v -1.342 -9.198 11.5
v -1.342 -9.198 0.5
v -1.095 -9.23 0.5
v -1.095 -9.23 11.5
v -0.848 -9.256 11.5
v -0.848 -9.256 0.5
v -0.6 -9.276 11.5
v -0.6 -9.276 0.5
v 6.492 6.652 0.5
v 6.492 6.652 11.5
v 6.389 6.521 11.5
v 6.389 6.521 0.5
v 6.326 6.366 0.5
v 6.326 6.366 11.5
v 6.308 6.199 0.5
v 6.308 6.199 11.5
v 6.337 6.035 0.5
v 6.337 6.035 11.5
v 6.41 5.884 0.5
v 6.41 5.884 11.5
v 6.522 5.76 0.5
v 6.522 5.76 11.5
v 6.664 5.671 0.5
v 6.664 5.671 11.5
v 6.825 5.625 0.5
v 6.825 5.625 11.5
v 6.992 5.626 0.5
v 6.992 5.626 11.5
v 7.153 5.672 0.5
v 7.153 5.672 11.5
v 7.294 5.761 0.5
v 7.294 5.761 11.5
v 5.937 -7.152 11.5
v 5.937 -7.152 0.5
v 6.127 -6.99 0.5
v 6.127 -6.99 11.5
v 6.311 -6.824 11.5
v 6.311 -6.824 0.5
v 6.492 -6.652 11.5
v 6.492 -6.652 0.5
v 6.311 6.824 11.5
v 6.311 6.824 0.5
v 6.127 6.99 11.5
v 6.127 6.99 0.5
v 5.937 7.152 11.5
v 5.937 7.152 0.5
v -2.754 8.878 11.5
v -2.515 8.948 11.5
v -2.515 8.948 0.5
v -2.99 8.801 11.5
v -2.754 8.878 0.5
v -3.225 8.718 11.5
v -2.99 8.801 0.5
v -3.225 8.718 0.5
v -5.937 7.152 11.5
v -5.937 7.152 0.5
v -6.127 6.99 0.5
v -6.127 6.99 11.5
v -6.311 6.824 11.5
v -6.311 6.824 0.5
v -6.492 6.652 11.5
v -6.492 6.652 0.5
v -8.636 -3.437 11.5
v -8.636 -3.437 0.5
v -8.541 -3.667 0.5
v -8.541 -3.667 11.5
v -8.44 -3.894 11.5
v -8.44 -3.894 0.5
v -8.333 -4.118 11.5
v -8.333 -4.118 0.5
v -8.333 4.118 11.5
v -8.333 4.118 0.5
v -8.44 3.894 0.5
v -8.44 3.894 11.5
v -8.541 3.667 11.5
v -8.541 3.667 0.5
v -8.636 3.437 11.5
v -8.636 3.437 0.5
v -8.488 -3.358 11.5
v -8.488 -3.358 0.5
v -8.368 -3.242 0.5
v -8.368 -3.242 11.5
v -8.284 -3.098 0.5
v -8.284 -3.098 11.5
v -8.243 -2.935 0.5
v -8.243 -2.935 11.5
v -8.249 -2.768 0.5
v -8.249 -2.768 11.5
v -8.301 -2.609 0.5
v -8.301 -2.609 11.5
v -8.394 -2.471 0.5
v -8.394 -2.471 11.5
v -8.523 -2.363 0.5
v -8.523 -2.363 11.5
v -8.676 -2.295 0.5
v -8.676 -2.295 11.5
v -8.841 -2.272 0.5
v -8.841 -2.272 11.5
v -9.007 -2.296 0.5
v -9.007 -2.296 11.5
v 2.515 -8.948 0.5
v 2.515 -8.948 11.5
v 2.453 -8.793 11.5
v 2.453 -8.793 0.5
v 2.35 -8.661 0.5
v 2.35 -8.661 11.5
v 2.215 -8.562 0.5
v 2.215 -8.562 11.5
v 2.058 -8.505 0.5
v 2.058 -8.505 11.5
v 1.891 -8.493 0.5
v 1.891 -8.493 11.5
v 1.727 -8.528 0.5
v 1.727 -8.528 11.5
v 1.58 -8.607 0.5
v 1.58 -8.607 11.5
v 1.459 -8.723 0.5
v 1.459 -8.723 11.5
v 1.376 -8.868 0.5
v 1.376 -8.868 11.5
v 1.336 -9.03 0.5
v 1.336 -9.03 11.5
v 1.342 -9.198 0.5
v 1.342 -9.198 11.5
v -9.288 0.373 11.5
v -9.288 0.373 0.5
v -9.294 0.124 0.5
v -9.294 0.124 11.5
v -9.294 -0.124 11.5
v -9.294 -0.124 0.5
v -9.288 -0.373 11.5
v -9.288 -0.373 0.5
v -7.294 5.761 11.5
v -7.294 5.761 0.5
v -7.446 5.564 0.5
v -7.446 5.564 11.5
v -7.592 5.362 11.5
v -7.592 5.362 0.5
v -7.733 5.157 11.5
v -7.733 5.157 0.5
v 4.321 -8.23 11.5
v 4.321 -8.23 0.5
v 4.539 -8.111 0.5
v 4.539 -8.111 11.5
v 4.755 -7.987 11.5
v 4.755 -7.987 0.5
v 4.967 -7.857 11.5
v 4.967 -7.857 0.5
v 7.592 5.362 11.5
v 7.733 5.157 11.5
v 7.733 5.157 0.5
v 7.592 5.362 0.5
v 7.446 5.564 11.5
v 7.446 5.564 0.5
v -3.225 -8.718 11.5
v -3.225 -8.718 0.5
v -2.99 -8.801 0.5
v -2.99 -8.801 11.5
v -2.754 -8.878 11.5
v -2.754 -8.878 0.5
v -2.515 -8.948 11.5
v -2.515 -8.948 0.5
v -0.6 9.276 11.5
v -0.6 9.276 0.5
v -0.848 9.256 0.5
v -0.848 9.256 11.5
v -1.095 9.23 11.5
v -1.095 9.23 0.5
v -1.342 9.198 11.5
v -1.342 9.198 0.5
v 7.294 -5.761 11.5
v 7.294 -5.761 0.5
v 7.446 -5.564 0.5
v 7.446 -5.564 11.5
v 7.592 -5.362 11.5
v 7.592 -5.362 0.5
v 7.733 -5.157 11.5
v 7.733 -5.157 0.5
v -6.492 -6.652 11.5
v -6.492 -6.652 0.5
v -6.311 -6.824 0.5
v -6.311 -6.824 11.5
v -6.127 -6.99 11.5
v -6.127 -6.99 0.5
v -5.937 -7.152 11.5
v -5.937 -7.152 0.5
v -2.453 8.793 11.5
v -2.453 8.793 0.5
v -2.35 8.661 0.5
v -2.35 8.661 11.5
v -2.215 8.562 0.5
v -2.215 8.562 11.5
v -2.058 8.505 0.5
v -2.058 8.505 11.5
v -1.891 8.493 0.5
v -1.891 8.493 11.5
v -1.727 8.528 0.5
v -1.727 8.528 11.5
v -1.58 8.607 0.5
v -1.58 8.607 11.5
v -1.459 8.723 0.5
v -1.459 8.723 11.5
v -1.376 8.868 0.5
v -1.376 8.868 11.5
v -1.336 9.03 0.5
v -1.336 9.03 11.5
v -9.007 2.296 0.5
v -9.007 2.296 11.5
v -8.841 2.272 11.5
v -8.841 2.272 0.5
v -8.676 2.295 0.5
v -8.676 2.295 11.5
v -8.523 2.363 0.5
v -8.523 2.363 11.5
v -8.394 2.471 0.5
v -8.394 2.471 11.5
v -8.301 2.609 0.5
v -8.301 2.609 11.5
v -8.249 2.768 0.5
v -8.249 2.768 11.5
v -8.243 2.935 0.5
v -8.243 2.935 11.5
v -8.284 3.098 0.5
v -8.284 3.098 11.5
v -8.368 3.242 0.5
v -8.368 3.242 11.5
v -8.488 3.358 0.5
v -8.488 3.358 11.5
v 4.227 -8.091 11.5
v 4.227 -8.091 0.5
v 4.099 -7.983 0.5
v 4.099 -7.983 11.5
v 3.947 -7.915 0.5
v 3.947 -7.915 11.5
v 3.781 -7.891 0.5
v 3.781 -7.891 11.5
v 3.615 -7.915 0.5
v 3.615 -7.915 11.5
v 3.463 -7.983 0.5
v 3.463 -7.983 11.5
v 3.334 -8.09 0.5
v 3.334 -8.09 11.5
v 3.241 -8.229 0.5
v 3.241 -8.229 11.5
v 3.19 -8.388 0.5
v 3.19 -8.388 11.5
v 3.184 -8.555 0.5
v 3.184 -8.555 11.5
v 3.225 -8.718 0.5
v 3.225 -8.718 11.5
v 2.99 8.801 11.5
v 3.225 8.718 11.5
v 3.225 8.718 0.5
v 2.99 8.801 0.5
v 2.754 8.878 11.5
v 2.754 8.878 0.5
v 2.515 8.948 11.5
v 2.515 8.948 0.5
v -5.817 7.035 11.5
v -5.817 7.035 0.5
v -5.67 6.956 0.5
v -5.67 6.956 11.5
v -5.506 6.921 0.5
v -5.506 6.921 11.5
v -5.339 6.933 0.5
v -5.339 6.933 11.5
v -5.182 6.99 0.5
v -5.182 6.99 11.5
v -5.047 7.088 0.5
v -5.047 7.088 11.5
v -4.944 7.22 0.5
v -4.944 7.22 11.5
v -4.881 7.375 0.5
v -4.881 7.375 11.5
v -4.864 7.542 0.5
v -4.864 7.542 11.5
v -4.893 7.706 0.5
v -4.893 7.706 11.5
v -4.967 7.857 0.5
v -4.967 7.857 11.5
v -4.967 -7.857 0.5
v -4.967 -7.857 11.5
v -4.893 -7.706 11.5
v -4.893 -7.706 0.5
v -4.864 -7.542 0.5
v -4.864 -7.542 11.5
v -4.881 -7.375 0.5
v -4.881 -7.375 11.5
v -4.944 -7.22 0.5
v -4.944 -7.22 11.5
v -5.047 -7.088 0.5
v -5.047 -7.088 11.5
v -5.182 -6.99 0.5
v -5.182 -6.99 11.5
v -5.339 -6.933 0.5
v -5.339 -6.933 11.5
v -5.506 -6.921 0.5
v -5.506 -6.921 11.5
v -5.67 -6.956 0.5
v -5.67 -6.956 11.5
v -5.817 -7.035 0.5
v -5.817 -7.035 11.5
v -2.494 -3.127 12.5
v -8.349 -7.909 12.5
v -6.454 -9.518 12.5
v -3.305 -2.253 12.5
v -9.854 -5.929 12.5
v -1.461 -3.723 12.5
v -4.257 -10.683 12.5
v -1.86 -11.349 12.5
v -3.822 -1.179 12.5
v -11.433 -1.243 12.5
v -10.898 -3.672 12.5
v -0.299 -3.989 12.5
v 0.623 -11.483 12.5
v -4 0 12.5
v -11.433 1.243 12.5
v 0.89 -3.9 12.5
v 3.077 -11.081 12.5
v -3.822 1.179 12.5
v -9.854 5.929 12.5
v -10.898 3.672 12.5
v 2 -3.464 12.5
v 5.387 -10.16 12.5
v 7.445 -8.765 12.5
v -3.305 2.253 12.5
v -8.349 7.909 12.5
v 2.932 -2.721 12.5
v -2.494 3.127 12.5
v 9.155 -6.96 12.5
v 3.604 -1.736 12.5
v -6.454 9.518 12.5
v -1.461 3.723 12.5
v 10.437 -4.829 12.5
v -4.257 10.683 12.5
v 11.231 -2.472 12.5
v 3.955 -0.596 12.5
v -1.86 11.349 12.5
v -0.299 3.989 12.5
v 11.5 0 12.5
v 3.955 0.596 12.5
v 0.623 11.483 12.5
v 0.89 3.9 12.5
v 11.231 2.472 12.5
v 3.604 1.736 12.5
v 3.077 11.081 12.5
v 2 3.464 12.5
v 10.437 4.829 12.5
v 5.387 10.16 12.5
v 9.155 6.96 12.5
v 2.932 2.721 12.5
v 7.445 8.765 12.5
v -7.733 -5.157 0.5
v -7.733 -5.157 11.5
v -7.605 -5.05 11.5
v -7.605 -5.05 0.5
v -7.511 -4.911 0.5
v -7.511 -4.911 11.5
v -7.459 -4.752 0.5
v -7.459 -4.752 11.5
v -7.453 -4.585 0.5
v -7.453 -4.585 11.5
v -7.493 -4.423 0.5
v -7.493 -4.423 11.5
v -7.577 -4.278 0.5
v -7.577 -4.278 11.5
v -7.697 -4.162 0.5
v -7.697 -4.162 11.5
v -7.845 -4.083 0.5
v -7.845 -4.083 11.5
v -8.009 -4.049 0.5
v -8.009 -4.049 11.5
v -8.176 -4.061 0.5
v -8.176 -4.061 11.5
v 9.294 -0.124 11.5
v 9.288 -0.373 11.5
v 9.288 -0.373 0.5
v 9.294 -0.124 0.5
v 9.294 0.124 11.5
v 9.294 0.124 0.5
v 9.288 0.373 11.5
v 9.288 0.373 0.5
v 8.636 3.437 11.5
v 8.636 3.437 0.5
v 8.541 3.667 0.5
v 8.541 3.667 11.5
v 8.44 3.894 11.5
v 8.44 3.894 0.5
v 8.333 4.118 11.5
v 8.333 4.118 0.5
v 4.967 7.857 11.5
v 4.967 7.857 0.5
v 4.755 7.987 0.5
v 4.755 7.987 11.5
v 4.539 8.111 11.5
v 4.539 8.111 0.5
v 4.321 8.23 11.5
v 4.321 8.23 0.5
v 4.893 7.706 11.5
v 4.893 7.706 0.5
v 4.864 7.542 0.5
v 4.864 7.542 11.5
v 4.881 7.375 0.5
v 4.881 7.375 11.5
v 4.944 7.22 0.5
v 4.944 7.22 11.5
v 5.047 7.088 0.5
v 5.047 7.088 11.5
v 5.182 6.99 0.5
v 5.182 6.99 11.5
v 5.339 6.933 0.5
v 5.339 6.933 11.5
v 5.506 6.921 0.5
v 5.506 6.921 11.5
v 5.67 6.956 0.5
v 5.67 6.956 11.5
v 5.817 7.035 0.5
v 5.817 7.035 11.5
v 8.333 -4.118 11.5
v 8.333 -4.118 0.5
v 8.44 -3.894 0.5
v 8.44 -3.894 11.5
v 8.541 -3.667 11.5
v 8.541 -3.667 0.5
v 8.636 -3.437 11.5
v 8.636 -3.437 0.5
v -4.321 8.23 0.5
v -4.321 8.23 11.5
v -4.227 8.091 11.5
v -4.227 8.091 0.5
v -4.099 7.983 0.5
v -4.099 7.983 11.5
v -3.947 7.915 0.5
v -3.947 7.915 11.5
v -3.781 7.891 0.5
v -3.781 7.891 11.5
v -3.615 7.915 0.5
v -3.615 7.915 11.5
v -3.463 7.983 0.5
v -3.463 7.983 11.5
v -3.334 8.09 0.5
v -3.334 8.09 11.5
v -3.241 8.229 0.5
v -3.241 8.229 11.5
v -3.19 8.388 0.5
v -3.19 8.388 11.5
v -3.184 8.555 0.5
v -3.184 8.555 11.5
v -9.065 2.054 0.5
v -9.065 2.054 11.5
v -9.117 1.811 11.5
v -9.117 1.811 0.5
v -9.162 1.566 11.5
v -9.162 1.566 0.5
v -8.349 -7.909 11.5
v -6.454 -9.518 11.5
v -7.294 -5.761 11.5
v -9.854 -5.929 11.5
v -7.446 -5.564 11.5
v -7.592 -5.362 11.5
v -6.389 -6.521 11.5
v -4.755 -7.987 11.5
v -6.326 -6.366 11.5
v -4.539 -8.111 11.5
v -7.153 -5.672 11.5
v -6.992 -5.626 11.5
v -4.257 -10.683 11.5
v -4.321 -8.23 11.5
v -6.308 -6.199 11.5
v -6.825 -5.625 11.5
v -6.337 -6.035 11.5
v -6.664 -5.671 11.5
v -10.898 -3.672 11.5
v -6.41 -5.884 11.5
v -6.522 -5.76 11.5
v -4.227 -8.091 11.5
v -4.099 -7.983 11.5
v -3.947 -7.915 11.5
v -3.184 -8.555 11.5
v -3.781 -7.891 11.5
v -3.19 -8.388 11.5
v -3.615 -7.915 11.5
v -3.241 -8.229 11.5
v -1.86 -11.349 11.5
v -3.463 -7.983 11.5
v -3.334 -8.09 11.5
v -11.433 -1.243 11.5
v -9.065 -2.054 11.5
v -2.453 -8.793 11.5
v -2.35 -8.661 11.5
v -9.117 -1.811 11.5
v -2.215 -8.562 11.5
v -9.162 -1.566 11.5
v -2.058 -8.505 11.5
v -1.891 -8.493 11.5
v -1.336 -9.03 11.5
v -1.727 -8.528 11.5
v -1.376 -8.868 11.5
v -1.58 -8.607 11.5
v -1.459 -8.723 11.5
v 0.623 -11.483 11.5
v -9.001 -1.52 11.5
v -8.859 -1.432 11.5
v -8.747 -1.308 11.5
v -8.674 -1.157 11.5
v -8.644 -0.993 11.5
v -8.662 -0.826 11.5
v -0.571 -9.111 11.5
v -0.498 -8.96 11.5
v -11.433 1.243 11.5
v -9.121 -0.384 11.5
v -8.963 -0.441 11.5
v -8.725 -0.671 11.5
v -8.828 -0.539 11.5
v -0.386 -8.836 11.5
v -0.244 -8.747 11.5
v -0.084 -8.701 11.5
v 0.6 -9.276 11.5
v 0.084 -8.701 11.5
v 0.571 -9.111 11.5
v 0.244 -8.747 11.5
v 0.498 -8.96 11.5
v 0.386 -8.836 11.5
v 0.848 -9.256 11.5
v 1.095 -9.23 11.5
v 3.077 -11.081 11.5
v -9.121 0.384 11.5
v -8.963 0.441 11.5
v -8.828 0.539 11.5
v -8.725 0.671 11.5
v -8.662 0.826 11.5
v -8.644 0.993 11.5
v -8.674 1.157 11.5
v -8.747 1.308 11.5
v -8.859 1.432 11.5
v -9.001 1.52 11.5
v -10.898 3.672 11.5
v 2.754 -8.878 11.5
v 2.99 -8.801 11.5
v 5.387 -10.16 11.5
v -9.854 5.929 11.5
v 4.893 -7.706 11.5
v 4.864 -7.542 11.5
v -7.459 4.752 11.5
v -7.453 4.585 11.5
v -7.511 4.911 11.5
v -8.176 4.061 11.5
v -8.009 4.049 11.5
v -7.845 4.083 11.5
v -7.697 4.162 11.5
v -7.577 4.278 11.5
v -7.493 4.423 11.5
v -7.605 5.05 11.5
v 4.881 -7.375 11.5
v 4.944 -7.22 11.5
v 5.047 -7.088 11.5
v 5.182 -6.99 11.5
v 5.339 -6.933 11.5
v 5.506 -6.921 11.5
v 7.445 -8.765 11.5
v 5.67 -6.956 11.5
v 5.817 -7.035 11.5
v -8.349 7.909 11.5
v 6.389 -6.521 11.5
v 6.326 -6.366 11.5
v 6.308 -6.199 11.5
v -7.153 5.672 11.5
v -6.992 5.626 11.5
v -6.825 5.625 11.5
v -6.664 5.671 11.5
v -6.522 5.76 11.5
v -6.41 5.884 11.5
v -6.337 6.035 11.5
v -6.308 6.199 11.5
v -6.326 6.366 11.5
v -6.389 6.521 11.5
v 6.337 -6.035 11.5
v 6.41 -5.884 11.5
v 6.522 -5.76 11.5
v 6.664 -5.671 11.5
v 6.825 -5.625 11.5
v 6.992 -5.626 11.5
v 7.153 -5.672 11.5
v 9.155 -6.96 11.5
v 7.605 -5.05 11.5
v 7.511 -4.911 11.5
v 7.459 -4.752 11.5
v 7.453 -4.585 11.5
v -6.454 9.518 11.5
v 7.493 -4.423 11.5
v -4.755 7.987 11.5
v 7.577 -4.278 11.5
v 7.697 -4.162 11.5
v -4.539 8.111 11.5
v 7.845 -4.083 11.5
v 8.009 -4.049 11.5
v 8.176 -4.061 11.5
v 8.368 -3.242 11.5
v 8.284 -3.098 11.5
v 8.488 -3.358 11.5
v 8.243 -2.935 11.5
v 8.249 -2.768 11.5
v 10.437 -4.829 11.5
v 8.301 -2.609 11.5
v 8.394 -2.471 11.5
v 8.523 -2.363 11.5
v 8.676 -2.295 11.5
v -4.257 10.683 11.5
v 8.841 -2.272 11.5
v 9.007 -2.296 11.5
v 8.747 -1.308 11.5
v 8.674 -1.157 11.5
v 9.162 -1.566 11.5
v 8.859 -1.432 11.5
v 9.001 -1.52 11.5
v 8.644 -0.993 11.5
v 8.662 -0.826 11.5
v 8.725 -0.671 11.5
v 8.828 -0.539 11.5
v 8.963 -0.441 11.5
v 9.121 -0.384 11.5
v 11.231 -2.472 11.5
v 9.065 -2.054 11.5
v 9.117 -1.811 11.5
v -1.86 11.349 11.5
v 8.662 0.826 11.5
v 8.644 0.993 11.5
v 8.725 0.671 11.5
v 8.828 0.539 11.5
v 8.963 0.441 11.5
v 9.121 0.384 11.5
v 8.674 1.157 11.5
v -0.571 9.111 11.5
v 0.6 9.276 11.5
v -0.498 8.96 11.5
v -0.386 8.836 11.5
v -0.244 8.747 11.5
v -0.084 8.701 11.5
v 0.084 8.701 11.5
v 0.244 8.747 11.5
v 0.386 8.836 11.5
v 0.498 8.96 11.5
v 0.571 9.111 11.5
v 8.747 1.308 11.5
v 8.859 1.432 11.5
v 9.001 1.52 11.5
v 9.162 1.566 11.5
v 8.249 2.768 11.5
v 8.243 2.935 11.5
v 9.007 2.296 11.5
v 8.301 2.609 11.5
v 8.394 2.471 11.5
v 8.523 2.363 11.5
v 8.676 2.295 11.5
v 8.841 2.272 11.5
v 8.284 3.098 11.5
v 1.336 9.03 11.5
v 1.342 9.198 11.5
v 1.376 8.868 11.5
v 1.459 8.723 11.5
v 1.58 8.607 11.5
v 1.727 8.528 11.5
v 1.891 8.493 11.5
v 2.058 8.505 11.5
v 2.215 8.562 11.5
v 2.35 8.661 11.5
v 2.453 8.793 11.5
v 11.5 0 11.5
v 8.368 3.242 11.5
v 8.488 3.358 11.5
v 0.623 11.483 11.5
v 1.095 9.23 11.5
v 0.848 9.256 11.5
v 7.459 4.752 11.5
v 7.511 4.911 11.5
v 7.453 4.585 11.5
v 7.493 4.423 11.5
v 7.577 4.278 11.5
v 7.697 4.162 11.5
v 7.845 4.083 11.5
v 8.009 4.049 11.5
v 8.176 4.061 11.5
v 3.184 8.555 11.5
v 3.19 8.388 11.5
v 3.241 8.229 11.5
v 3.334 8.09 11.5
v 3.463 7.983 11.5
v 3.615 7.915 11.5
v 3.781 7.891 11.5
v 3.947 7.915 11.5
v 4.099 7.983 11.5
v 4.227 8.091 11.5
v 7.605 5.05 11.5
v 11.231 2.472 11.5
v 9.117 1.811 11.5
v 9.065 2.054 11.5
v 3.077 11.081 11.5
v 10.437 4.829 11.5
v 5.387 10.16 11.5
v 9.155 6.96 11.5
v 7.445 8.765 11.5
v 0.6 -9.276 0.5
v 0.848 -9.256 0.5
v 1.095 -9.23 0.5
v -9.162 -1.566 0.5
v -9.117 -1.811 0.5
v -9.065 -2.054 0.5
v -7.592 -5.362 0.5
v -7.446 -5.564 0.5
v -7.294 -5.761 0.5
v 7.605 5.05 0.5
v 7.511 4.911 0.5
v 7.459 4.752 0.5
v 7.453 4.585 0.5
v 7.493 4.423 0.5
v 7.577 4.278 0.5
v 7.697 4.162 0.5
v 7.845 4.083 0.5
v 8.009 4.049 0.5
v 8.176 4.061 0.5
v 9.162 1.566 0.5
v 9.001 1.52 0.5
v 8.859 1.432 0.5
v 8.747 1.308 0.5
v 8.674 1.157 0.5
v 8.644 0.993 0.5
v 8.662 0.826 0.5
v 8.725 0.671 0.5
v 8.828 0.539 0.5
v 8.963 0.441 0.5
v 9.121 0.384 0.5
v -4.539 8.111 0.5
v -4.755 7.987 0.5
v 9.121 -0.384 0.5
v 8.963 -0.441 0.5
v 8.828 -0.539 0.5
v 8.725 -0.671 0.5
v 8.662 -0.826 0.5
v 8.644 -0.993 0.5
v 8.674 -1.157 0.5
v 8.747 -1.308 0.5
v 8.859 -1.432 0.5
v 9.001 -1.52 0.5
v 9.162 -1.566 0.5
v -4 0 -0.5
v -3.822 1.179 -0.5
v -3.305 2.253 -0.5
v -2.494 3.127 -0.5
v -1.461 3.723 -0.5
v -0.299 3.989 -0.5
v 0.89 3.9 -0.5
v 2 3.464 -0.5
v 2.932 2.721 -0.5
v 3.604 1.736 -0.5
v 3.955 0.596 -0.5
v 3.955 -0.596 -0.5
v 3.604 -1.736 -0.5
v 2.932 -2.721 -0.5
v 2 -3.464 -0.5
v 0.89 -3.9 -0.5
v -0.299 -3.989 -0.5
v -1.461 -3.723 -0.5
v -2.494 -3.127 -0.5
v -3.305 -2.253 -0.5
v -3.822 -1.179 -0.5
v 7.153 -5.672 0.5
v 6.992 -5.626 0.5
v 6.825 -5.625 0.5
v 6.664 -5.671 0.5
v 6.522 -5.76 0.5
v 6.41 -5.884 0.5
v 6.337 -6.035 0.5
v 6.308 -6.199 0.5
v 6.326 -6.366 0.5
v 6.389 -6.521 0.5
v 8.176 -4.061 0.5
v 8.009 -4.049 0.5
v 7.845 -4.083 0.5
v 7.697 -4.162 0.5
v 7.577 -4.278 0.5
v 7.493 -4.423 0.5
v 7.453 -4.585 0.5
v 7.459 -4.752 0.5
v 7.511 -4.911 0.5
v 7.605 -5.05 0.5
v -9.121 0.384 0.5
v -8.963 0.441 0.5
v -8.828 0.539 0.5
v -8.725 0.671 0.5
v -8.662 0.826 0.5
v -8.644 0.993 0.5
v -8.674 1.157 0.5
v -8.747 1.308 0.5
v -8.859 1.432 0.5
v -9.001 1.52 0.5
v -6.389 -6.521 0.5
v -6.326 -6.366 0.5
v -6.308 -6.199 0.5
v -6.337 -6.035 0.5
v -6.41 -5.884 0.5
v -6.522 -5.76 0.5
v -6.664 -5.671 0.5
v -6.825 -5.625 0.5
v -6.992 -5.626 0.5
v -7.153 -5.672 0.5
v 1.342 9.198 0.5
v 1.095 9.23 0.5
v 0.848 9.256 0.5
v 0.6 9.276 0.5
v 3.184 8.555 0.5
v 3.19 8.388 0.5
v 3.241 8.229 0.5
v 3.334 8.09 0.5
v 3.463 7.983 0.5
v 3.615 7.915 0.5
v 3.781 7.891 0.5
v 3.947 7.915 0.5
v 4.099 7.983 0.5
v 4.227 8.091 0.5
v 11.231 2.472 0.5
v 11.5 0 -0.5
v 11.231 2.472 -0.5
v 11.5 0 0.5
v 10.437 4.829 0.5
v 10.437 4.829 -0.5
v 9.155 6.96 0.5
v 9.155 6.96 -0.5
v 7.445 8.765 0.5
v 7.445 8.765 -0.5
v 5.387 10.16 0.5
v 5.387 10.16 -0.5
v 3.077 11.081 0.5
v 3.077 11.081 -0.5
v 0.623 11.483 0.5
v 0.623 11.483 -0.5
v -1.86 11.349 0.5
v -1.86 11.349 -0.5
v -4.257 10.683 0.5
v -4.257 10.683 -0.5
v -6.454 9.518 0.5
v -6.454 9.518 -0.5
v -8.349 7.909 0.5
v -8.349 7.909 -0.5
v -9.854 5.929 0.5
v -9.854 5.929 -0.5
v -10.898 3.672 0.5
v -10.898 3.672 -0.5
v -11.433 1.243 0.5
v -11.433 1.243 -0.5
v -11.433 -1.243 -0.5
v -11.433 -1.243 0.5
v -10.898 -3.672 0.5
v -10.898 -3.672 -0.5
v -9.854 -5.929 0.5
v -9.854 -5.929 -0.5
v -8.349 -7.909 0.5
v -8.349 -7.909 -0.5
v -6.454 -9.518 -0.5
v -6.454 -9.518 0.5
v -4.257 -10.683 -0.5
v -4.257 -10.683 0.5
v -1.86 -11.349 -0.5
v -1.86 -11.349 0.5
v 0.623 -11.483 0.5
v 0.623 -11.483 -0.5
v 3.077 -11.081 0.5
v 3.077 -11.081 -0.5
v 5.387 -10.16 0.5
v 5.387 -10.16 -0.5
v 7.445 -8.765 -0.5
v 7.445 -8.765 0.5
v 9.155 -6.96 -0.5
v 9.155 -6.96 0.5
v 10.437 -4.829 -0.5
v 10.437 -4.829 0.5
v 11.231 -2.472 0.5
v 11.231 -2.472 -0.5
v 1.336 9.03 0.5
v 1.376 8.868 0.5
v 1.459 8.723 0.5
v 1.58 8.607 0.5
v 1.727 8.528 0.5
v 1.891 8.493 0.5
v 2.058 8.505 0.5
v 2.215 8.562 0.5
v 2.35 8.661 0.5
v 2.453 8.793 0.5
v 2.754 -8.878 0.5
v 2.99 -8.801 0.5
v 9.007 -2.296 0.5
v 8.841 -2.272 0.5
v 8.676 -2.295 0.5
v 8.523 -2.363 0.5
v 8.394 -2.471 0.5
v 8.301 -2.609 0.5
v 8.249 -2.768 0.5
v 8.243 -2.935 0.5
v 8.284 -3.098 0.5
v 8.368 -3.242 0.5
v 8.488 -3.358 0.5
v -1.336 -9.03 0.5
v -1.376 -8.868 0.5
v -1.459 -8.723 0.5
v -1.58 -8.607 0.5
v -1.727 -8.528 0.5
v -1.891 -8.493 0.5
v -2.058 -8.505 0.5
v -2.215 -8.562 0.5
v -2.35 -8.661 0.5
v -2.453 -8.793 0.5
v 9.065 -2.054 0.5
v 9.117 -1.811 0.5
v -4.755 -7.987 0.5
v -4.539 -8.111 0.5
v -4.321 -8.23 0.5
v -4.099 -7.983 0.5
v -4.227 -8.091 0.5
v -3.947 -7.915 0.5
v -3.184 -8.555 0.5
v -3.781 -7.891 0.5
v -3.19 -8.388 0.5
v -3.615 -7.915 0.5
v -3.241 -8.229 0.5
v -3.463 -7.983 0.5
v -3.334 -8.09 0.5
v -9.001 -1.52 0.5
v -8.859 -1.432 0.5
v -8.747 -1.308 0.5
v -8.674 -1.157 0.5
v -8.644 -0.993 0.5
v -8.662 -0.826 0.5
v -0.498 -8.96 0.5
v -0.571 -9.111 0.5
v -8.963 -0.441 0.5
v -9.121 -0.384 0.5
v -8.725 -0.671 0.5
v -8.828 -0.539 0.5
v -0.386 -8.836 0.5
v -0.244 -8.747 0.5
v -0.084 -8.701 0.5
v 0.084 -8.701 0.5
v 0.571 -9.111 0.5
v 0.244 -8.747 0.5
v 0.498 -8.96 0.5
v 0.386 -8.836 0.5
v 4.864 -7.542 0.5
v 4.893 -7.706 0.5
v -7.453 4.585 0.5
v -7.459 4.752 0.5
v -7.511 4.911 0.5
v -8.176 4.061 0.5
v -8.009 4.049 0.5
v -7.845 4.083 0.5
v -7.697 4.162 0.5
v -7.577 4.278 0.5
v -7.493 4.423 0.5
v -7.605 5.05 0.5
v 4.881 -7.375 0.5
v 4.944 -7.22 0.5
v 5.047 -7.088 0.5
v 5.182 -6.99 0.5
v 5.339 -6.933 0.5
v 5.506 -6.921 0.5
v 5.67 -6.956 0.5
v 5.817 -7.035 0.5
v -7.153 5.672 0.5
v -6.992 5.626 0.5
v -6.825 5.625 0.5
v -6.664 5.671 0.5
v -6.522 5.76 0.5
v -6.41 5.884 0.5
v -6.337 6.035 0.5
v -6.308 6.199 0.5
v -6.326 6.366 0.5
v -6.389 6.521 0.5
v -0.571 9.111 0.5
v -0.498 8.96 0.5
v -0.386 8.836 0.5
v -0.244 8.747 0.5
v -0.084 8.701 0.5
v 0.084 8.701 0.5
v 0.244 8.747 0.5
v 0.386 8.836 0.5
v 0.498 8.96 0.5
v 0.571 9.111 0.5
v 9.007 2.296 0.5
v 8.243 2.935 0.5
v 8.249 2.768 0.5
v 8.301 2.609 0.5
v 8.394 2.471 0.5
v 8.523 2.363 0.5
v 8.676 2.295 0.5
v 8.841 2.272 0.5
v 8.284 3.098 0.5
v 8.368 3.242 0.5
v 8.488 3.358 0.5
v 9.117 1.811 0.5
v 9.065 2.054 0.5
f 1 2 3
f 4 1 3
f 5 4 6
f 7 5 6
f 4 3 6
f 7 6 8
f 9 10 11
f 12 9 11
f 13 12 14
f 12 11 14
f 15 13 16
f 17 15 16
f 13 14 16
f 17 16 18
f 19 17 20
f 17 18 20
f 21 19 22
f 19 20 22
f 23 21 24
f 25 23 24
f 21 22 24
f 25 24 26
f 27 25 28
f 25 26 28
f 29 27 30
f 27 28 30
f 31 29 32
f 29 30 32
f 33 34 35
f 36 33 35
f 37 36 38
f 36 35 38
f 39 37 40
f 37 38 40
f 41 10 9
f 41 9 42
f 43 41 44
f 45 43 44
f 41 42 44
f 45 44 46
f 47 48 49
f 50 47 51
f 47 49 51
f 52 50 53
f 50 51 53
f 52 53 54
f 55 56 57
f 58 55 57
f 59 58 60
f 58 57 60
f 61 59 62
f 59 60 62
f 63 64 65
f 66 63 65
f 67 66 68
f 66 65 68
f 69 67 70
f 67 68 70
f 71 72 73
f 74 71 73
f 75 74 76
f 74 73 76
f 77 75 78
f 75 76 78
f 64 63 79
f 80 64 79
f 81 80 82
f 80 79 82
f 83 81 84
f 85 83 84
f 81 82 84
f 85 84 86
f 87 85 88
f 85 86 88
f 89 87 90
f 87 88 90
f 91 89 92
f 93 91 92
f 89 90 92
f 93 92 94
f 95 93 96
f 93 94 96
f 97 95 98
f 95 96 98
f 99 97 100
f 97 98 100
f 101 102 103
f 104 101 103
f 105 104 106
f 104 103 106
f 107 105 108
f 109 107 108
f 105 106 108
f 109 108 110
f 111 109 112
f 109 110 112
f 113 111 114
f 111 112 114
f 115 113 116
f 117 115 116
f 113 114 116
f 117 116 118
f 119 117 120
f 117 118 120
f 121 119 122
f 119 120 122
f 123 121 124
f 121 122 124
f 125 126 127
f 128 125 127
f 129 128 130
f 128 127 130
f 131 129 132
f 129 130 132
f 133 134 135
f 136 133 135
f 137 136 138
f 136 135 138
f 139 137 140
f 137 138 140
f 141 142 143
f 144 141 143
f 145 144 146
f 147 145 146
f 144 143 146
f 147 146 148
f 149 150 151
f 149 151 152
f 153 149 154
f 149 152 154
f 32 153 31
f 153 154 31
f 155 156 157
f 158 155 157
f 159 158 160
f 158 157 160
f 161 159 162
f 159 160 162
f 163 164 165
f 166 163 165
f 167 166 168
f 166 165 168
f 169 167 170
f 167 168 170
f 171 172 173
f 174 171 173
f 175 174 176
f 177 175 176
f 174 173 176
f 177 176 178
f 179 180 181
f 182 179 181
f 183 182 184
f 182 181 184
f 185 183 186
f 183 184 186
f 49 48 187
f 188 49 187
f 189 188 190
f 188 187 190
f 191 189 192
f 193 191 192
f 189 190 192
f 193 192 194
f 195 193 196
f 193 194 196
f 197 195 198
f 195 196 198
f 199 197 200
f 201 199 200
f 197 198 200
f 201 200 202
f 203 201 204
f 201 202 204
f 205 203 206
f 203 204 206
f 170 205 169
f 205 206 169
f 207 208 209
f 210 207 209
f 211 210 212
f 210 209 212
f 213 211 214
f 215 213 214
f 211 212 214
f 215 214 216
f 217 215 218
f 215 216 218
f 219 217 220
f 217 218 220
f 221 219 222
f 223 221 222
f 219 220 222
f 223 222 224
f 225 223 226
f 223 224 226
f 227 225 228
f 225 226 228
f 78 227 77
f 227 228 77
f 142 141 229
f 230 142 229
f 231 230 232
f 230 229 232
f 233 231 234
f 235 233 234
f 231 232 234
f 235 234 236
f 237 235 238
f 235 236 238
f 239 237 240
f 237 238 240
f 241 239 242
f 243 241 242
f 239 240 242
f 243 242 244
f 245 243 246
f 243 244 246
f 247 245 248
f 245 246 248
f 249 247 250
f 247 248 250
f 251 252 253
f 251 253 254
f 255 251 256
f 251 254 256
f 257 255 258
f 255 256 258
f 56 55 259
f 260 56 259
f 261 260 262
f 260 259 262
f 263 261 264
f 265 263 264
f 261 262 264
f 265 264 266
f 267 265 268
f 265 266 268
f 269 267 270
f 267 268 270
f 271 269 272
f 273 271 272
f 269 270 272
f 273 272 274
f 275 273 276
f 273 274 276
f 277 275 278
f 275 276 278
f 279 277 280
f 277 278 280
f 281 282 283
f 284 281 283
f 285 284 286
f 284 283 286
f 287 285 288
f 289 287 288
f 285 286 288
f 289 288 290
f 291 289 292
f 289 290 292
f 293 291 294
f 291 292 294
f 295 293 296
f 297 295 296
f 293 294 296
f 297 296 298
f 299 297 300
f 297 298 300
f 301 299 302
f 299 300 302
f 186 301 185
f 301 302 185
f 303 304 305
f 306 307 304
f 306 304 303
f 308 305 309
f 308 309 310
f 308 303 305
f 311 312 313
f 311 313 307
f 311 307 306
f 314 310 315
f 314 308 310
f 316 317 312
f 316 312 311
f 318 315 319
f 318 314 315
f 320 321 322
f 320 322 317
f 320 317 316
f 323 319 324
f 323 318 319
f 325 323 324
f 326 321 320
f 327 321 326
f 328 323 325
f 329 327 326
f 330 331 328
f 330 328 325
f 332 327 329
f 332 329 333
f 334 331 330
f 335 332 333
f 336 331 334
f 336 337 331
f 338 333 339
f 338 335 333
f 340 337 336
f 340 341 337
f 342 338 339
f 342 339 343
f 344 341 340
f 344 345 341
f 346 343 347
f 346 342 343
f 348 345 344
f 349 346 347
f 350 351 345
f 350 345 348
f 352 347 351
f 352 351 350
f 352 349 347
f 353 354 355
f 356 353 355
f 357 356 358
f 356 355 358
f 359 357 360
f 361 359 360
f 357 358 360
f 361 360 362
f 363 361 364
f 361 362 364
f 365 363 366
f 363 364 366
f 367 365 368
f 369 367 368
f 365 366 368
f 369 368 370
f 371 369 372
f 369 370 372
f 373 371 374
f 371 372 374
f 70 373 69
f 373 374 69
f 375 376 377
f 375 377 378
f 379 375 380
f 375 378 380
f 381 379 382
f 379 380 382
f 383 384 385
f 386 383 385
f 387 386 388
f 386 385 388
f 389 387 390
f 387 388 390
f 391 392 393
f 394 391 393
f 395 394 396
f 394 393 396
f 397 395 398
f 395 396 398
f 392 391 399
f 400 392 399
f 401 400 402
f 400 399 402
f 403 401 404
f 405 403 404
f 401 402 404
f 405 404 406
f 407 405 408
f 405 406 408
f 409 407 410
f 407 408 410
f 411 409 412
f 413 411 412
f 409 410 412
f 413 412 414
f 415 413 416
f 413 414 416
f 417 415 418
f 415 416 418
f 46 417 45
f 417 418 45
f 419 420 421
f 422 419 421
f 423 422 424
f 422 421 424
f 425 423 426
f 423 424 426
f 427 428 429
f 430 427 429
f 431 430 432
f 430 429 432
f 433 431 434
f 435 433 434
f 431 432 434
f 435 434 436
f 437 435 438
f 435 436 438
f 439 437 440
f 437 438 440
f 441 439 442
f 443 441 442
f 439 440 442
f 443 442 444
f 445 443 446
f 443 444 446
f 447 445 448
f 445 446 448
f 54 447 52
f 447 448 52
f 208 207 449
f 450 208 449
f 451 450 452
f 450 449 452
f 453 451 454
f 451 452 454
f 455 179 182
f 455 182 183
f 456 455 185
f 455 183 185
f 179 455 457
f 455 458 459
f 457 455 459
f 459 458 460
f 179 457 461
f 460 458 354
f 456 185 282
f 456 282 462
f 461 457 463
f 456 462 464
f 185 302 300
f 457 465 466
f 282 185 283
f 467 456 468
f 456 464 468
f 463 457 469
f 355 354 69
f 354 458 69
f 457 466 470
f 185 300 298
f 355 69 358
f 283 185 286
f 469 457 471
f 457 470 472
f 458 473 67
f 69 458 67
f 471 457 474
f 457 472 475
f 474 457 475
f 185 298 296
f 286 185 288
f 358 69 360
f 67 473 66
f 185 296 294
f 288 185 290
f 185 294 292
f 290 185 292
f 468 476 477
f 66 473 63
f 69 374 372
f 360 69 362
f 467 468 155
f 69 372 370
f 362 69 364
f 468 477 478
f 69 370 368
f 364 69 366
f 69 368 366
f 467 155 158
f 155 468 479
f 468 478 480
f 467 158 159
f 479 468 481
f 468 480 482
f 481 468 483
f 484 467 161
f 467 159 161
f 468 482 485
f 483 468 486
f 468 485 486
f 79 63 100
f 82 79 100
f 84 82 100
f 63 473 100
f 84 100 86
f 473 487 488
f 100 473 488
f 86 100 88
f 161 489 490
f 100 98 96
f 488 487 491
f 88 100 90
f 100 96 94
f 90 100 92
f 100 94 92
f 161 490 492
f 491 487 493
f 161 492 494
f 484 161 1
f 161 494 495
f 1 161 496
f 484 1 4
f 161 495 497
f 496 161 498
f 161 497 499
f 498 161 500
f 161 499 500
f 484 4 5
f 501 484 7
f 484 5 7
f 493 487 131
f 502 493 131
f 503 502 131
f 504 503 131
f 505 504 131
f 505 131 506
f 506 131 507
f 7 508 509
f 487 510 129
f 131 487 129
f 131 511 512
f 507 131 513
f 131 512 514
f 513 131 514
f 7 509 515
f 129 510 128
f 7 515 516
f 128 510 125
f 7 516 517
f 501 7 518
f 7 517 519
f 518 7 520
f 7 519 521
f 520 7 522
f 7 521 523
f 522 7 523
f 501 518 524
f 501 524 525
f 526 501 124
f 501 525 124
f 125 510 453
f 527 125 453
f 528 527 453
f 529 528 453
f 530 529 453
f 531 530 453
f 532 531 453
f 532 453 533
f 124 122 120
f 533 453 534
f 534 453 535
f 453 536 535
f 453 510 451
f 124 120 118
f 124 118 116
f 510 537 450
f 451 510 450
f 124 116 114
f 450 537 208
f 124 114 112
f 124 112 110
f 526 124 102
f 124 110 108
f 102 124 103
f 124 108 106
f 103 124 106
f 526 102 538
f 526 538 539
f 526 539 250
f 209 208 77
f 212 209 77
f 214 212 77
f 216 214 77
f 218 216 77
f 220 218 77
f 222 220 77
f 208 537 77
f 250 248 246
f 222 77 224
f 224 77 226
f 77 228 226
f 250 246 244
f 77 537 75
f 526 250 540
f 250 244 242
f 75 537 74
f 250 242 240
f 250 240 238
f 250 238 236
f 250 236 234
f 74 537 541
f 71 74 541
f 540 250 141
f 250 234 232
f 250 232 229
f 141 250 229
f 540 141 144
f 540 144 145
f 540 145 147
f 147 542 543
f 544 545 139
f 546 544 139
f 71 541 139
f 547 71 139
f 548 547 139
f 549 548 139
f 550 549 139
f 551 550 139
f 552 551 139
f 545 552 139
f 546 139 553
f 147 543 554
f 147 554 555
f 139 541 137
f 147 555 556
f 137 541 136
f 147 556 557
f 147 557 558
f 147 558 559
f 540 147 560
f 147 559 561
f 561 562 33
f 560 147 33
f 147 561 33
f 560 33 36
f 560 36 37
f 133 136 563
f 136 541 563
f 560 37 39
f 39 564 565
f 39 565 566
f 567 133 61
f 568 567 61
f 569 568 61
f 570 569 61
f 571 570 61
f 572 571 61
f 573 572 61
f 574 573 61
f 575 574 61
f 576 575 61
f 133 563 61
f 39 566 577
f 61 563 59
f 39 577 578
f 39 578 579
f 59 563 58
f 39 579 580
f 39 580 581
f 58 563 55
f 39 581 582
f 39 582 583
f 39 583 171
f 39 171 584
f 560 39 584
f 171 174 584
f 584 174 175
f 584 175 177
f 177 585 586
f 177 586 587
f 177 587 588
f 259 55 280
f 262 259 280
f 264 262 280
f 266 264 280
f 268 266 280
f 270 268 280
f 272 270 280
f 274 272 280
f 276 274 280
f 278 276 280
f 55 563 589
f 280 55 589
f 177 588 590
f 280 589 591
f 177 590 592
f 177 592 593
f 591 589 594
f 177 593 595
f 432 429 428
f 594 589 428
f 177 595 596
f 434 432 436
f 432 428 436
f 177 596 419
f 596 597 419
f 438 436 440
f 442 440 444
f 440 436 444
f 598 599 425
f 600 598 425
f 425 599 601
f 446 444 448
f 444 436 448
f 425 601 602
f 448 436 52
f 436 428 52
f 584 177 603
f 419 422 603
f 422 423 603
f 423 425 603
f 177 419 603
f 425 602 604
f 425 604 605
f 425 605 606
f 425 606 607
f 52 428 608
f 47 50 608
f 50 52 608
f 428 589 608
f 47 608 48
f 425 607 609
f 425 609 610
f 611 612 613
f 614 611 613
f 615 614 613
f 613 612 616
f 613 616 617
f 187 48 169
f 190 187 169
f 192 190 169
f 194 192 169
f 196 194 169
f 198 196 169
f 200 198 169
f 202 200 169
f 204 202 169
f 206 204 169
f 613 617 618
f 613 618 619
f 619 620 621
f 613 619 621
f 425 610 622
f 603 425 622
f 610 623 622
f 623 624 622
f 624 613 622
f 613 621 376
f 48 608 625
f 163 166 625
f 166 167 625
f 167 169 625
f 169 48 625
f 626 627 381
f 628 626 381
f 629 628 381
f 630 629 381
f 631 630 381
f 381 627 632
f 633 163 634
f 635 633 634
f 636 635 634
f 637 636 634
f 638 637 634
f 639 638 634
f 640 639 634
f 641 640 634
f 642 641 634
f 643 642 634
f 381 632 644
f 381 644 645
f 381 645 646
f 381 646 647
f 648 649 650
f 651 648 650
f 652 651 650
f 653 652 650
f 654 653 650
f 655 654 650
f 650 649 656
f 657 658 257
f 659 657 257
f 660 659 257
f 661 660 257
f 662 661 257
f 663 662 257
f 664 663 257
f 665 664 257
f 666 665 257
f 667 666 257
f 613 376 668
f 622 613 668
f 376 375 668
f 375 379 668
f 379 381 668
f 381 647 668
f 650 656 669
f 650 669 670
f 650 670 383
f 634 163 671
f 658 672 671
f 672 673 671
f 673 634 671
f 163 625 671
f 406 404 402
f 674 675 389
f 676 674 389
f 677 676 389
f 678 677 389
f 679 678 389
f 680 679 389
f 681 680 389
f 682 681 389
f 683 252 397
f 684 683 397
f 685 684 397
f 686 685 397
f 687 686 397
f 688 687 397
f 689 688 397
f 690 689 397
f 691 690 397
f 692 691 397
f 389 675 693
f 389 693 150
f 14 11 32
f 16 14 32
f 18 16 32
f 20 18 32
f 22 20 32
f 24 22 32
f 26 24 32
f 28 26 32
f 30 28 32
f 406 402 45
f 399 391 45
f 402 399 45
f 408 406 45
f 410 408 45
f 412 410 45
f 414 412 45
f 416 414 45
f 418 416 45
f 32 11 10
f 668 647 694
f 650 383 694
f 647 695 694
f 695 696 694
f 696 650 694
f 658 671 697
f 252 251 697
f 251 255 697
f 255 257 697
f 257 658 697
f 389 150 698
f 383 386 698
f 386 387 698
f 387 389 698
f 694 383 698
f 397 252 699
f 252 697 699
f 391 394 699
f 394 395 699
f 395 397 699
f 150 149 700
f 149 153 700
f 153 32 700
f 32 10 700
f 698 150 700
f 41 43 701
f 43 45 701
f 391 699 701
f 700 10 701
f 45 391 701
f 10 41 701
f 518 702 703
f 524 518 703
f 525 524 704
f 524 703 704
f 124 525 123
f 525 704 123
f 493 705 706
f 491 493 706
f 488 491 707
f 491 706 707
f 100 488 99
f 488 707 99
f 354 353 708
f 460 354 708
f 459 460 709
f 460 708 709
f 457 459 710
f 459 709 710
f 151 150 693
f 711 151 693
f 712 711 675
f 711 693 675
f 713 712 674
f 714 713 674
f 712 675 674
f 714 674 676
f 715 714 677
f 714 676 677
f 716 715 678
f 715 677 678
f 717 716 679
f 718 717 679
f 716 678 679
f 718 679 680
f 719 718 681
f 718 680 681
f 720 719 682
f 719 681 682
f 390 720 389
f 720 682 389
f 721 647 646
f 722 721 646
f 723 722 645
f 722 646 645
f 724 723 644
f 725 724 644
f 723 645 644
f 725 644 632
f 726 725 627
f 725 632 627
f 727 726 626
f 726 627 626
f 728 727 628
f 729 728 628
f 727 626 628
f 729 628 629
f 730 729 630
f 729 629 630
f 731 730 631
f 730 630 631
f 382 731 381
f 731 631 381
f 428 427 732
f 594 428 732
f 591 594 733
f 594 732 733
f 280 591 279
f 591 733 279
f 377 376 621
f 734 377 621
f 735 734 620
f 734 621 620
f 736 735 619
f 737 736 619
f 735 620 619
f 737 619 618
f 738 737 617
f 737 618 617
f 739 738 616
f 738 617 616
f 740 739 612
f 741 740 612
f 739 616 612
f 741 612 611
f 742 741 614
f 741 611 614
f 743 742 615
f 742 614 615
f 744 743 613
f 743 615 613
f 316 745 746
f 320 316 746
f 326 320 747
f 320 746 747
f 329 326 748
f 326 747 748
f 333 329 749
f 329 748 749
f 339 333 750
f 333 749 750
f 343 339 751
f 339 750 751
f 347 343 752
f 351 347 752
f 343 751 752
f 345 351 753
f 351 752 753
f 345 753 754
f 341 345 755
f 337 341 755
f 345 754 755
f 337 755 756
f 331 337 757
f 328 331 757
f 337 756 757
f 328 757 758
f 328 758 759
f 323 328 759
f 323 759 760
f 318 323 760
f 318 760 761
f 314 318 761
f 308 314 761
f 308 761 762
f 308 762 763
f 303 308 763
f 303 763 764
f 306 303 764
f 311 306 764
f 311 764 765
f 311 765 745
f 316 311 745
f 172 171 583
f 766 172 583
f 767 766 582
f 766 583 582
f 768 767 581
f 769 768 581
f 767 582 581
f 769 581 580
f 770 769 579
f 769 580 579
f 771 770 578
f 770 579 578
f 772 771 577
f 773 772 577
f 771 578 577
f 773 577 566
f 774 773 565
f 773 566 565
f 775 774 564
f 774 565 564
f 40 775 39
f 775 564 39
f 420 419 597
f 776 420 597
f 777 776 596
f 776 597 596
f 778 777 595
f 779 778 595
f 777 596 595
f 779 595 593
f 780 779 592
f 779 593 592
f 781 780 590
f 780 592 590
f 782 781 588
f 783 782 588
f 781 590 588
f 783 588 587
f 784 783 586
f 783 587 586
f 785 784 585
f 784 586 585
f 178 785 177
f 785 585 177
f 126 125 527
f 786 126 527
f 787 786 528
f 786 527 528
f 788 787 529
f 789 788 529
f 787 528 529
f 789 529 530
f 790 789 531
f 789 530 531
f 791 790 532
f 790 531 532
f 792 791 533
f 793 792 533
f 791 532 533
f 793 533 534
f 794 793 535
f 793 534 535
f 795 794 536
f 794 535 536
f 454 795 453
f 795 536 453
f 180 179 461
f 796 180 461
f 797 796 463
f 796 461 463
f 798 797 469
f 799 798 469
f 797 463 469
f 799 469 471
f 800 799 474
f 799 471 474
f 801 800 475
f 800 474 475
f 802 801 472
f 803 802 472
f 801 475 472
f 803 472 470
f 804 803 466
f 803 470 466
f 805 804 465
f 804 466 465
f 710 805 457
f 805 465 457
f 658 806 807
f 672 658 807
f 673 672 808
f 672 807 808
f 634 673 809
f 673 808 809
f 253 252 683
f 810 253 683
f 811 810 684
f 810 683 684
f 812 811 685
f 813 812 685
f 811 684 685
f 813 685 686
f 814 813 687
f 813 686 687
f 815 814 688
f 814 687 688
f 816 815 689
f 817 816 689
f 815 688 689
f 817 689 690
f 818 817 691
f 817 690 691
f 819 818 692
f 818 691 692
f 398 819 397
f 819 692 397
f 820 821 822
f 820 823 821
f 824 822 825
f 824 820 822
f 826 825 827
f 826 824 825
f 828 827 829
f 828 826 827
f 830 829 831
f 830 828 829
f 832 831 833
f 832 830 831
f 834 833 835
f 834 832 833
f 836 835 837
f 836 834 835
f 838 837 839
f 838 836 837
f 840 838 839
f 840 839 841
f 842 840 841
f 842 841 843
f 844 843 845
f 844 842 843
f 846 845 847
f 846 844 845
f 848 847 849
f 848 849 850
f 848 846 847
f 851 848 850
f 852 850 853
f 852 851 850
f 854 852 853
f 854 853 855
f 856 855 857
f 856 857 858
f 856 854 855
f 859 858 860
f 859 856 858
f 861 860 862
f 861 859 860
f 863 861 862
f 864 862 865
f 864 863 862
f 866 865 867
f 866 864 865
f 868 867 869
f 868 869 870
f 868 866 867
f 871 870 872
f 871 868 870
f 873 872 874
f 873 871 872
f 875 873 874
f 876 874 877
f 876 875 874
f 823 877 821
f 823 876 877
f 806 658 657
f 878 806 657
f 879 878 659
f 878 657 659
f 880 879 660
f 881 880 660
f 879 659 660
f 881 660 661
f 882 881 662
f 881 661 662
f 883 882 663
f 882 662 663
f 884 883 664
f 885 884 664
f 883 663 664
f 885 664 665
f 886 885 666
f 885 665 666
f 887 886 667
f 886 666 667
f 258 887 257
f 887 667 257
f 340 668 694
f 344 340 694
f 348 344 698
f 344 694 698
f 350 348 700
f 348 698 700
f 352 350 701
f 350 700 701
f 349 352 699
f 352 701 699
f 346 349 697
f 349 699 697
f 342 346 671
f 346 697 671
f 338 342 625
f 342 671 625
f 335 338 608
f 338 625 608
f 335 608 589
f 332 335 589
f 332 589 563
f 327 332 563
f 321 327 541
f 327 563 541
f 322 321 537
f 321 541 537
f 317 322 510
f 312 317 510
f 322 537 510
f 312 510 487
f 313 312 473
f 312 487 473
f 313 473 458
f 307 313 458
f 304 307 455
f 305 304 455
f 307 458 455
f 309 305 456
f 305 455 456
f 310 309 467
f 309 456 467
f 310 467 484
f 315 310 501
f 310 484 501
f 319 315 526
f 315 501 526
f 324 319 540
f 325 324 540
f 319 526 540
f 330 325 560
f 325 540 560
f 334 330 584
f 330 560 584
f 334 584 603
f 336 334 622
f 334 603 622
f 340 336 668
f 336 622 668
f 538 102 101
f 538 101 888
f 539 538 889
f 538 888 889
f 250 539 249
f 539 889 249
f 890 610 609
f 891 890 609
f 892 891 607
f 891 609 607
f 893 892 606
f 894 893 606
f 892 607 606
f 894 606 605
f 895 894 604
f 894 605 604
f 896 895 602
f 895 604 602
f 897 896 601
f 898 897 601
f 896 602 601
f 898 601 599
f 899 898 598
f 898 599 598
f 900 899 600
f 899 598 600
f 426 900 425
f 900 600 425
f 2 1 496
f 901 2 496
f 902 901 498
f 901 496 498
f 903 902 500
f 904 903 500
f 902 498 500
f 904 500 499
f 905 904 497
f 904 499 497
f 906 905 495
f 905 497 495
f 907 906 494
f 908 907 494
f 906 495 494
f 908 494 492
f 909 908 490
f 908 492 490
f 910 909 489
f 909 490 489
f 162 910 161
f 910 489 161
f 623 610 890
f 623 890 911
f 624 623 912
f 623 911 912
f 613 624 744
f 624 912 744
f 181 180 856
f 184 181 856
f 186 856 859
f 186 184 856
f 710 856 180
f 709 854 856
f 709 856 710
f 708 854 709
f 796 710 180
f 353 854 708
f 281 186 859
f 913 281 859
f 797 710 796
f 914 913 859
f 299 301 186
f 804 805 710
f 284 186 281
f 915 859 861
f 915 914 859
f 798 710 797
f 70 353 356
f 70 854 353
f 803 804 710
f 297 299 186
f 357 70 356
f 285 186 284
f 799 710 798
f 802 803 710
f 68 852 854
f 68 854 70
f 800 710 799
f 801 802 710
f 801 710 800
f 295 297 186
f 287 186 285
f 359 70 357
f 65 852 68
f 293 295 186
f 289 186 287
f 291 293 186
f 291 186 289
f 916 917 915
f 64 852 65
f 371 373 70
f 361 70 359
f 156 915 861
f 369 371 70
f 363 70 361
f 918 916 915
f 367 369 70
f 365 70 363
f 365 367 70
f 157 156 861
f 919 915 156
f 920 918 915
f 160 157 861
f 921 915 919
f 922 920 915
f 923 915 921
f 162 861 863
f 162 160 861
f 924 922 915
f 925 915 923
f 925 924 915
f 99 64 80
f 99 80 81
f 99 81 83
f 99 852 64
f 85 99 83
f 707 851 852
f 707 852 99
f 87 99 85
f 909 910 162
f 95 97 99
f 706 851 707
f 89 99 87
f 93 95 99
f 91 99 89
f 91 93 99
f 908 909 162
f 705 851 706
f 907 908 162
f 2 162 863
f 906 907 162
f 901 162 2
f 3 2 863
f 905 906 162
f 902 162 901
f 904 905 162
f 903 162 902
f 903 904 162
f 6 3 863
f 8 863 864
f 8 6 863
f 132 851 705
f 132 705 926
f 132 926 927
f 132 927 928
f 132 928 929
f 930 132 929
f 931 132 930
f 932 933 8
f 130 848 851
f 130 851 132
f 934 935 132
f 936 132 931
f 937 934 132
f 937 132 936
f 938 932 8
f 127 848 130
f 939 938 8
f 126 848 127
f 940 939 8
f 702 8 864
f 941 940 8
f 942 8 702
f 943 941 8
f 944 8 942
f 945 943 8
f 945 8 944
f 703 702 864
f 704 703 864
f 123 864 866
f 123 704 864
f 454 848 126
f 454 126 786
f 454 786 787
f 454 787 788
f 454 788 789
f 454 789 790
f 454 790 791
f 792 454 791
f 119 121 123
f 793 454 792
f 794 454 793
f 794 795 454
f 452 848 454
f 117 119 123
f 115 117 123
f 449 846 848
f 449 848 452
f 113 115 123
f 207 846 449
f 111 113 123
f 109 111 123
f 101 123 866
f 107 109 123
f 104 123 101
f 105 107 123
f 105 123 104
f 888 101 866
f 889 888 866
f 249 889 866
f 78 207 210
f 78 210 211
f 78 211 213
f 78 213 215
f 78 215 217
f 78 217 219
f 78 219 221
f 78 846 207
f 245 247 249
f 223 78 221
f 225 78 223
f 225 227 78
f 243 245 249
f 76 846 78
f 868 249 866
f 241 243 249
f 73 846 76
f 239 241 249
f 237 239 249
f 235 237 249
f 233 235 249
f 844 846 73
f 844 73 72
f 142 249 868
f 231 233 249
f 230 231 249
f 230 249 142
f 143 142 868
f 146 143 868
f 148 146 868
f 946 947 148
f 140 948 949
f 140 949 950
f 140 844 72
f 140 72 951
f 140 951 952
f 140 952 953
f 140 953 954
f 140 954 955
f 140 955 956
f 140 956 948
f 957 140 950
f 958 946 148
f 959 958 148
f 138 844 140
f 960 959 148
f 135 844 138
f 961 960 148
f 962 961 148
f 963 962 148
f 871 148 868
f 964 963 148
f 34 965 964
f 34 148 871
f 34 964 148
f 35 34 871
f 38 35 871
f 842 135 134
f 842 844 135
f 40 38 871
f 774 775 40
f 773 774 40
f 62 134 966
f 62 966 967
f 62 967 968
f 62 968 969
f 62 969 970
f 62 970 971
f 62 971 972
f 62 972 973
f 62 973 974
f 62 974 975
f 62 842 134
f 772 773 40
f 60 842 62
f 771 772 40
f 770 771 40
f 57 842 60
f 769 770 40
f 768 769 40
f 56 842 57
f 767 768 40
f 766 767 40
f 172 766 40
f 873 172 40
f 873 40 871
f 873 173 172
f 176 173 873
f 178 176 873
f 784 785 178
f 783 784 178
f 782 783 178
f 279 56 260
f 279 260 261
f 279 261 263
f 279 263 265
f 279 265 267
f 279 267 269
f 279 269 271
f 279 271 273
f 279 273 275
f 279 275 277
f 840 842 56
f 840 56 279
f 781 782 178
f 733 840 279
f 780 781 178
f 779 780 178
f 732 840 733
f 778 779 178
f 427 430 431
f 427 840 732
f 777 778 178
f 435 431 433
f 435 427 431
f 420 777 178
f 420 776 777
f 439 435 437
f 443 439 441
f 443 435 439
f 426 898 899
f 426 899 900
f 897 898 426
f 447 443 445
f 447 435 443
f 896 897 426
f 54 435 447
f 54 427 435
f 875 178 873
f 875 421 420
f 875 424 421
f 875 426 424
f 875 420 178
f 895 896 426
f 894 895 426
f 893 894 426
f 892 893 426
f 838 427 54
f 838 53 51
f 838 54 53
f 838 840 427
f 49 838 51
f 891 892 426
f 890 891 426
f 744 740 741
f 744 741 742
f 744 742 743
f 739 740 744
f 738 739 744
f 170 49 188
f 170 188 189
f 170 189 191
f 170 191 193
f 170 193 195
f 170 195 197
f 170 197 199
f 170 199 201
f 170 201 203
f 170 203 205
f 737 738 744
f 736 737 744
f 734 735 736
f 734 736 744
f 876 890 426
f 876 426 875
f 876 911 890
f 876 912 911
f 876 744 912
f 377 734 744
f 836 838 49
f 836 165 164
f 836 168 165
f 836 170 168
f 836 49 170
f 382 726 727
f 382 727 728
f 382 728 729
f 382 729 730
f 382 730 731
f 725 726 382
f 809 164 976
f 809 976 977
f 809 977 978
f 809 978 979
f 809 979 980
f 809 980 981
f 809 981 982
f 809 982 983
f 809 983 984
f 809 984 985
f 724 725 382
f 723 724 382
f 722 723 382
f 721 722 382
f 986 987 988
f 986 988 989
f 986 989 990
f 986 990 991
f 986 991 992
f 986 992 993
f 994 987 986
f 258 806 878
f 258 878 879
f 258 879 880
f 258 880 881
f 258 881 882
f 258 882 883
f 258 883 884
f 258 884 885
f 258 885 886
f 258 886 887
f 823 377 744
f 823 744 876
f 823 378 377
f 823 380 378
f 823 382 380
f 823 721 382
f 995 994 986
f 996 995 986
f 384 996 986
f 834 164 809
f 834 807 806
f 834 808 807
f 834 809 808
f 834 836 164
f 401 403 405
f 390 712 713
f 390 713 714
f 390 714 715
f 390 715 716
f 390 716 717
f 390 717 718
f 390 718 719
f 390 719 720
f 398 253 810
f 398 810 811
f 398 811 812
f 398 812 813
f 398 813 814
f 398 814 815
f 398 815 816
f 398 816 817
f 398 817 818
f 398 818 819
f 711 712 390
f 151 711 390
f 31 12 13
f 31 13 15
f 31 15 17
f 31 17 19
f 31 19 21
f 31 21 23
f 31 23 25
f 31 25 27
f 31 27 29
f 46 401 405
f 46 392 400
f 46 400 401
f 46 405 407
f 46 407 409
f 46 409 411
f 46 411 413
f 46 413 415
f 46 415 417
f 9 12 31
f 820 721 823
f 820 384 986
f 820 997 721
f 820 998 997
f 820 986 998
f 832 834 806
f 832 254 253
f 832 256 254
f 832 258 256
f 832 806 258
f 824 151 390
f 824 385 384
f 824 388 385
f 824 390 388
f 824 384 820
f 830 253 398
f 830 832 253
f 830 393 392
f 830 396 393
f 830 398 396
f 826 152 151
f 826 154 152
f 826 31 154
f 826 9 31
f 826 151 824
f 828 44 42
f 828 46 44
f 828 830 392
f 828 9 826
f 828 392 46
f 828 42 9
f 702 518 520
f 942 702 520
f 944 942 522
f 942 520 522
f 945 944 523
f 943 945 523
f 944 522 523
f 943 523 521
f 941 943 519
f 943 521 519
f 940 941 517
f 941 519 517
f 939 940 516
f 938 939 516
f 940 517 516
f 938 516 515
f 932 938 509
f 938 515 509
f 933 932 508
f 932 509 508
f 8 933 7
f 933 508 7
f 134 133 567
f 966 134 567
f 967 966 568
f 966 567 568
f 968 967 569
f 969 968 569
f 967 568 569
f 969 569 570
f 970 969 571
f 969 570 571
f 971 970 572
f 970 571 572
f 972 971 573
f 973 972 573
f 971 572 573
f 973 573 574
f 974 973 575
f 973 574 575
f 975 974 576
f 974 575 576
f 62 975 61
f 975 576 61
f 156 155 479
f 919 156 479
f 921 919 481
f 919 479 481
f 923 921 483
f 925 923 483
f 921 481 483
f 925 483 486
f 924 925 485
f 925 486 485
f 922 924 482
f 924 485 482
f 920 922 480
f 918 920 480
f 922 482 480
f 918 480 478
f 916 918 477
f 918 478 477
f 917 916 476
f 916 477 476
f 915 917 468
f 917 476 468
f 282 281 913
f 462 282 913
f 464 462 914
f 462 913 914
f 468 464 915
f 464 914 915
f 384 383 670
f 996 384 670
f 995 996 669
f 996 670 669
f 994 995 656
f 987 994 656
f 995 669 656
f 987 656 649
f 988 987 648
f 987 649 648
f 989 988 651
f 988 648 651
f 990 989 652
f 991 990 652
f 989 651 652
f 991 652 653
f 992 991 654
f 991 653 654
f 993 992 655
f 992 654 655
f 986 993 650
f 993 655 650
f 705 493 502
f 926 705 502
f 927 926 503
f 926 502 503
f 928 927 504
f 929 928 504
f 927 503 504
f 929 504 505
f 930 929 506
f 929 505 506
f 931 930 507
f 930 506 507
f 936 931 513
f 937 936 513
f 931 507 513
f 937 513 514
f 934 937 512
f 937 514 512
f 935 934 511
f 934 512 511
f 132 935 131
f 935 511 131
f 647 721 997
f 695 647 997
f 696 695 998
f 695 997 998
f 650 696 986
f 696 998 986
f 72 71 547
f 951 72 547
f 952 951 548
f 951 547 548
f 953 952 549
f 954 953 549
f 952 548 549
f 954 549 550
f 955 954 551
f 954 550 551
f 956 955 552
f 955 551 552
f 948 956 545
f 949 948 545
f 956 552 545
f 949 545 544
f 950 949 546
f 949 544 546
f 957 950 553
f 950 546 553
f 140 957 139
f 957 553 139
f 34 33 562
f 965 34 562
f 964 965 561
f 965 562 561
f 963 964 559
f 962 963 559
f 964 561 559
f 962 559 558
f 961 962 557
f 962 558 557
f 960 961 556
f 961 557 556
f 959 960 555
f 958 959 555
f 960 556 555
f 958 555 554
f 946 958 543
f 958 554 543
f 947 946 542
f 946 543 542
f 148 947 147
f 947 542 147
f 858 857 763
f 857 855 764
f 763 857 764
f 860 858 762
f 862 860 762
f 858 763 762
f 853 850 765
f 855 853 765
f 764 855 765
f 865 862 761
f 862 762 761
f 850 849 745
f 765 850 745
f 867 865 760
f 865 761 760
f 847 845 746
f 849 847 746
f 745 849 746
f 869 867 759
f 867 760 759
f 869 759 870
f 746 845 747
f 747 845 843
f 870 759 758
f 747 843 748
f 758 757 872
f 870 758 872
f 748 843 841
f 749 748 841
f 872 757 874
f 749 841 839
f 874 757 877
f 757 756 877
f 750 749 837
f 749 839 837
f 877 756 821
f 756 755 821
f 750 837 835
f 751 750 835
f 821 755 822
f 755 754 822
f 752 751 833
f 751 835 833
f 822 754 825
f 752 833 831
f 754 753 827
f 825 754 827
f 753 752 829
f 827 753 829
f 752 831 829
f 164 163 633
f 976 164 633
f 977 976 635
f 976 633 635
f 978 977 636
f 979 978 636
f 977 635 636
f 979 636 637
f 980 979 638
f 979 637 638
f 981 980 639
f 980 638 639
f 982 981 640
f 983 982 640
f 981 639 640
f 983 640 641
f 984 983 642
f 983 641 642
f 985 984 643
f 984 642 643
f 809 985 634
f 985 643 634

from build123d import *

# Parameters (mm, degrees)
SKETCH_1_R               = 11.5
EXTRUDE_1_DEPTH          = 0.5
SKETCH_2_R               = 9.295
EXTRUDE_2_DEPTH          = 11
CUT_EXTRUDE_3_DEPTH      = 11
SKETCH_3_R               = 11.5
EXTRUDE_3_DEPTH          = 1
SKETCH_6_R               = 4
CUT_EXTRUDE_2_DEPTH      = 1
CUT_EXTRUDE_2_DEPTH_BACK = 14
PATTERN_CIRCULAR_2_COUNT = 30


with BuildPart() as part:
    # 草圖1 → 填料-伸長1 (new body, symmetric)
    with BuildSketch(Plane.XY):
        Circle(SKETCH_1_R)
    extrude(amount=EXTRUDE_1_DEPTH, both=True)

    # 草圖2 → 填料-伸長2 (add)
    with BuildSketch(Plane.XY.offset(0.5)):
        Circle(SKETCH_2_R)
    extrude(amount=EXTRUDE_2_DEPTH)

    # 草圖7 → 除料-伸長3 (cut)
    with BuildSketch(Plane.XY.offset(11.5)):
        with BuildLine():
            ThreePointArc((-0.599687408, 9.27563475), (0, 8.695), (0.599687408, 9.27563475))
            ThreePointArc((0.599687408, 9.27563475), (0, 9.295), (-0.599687408, 9.27563475))
        make_face()
    cut_extrude_3 = extrude(amount=-CUT_EXTRUDE_3_DEPTH, mode=Mode.SUBTRACT)

    # 草圖3 → 填料-伸長3 (add)
    with BuildSketch(Plane.XY.offset(11.5)):
        Circle(SKETCH_3_R)
    extrude(amount=EXTRUDE_3_DEPTH)

    # 草圖6 → 除料-伸長2 (cut, two sides)
    with BuildSketch(Plane(origin=(0, 0, -0.5), x_dir=(-1, 0, 0), z_dir=(0, 0, -1))) as cut_extrude_2_sk:
        Circle(SKETCH_6_R)
    extrude(amount=CUT_EXTRUDE_2_DEPTH, mode=Mode.SUBTRACT)
    extrude(cut_extrude_2_sk.sketch, amount=-CUT_EXTRUDE_2_DEPTH_BACK, mode=Mode.SUBTRACT)

    # 環狀複製排列2: 除料-伸長3 ×30 about axis
    pattern_circular_2_axis = Axis((0, 0, 0), (0, 0, 1))
    for i in range(1, PATTERN_CIRCULAR_2_COUNT):
        add(cut_extrude_3.rotate(pattern_circular_2_axis, i * 360 / PATTERN_CIRCULAR_2_COUNT), mode=Mode.SUBTRACT)


solid = part.part
